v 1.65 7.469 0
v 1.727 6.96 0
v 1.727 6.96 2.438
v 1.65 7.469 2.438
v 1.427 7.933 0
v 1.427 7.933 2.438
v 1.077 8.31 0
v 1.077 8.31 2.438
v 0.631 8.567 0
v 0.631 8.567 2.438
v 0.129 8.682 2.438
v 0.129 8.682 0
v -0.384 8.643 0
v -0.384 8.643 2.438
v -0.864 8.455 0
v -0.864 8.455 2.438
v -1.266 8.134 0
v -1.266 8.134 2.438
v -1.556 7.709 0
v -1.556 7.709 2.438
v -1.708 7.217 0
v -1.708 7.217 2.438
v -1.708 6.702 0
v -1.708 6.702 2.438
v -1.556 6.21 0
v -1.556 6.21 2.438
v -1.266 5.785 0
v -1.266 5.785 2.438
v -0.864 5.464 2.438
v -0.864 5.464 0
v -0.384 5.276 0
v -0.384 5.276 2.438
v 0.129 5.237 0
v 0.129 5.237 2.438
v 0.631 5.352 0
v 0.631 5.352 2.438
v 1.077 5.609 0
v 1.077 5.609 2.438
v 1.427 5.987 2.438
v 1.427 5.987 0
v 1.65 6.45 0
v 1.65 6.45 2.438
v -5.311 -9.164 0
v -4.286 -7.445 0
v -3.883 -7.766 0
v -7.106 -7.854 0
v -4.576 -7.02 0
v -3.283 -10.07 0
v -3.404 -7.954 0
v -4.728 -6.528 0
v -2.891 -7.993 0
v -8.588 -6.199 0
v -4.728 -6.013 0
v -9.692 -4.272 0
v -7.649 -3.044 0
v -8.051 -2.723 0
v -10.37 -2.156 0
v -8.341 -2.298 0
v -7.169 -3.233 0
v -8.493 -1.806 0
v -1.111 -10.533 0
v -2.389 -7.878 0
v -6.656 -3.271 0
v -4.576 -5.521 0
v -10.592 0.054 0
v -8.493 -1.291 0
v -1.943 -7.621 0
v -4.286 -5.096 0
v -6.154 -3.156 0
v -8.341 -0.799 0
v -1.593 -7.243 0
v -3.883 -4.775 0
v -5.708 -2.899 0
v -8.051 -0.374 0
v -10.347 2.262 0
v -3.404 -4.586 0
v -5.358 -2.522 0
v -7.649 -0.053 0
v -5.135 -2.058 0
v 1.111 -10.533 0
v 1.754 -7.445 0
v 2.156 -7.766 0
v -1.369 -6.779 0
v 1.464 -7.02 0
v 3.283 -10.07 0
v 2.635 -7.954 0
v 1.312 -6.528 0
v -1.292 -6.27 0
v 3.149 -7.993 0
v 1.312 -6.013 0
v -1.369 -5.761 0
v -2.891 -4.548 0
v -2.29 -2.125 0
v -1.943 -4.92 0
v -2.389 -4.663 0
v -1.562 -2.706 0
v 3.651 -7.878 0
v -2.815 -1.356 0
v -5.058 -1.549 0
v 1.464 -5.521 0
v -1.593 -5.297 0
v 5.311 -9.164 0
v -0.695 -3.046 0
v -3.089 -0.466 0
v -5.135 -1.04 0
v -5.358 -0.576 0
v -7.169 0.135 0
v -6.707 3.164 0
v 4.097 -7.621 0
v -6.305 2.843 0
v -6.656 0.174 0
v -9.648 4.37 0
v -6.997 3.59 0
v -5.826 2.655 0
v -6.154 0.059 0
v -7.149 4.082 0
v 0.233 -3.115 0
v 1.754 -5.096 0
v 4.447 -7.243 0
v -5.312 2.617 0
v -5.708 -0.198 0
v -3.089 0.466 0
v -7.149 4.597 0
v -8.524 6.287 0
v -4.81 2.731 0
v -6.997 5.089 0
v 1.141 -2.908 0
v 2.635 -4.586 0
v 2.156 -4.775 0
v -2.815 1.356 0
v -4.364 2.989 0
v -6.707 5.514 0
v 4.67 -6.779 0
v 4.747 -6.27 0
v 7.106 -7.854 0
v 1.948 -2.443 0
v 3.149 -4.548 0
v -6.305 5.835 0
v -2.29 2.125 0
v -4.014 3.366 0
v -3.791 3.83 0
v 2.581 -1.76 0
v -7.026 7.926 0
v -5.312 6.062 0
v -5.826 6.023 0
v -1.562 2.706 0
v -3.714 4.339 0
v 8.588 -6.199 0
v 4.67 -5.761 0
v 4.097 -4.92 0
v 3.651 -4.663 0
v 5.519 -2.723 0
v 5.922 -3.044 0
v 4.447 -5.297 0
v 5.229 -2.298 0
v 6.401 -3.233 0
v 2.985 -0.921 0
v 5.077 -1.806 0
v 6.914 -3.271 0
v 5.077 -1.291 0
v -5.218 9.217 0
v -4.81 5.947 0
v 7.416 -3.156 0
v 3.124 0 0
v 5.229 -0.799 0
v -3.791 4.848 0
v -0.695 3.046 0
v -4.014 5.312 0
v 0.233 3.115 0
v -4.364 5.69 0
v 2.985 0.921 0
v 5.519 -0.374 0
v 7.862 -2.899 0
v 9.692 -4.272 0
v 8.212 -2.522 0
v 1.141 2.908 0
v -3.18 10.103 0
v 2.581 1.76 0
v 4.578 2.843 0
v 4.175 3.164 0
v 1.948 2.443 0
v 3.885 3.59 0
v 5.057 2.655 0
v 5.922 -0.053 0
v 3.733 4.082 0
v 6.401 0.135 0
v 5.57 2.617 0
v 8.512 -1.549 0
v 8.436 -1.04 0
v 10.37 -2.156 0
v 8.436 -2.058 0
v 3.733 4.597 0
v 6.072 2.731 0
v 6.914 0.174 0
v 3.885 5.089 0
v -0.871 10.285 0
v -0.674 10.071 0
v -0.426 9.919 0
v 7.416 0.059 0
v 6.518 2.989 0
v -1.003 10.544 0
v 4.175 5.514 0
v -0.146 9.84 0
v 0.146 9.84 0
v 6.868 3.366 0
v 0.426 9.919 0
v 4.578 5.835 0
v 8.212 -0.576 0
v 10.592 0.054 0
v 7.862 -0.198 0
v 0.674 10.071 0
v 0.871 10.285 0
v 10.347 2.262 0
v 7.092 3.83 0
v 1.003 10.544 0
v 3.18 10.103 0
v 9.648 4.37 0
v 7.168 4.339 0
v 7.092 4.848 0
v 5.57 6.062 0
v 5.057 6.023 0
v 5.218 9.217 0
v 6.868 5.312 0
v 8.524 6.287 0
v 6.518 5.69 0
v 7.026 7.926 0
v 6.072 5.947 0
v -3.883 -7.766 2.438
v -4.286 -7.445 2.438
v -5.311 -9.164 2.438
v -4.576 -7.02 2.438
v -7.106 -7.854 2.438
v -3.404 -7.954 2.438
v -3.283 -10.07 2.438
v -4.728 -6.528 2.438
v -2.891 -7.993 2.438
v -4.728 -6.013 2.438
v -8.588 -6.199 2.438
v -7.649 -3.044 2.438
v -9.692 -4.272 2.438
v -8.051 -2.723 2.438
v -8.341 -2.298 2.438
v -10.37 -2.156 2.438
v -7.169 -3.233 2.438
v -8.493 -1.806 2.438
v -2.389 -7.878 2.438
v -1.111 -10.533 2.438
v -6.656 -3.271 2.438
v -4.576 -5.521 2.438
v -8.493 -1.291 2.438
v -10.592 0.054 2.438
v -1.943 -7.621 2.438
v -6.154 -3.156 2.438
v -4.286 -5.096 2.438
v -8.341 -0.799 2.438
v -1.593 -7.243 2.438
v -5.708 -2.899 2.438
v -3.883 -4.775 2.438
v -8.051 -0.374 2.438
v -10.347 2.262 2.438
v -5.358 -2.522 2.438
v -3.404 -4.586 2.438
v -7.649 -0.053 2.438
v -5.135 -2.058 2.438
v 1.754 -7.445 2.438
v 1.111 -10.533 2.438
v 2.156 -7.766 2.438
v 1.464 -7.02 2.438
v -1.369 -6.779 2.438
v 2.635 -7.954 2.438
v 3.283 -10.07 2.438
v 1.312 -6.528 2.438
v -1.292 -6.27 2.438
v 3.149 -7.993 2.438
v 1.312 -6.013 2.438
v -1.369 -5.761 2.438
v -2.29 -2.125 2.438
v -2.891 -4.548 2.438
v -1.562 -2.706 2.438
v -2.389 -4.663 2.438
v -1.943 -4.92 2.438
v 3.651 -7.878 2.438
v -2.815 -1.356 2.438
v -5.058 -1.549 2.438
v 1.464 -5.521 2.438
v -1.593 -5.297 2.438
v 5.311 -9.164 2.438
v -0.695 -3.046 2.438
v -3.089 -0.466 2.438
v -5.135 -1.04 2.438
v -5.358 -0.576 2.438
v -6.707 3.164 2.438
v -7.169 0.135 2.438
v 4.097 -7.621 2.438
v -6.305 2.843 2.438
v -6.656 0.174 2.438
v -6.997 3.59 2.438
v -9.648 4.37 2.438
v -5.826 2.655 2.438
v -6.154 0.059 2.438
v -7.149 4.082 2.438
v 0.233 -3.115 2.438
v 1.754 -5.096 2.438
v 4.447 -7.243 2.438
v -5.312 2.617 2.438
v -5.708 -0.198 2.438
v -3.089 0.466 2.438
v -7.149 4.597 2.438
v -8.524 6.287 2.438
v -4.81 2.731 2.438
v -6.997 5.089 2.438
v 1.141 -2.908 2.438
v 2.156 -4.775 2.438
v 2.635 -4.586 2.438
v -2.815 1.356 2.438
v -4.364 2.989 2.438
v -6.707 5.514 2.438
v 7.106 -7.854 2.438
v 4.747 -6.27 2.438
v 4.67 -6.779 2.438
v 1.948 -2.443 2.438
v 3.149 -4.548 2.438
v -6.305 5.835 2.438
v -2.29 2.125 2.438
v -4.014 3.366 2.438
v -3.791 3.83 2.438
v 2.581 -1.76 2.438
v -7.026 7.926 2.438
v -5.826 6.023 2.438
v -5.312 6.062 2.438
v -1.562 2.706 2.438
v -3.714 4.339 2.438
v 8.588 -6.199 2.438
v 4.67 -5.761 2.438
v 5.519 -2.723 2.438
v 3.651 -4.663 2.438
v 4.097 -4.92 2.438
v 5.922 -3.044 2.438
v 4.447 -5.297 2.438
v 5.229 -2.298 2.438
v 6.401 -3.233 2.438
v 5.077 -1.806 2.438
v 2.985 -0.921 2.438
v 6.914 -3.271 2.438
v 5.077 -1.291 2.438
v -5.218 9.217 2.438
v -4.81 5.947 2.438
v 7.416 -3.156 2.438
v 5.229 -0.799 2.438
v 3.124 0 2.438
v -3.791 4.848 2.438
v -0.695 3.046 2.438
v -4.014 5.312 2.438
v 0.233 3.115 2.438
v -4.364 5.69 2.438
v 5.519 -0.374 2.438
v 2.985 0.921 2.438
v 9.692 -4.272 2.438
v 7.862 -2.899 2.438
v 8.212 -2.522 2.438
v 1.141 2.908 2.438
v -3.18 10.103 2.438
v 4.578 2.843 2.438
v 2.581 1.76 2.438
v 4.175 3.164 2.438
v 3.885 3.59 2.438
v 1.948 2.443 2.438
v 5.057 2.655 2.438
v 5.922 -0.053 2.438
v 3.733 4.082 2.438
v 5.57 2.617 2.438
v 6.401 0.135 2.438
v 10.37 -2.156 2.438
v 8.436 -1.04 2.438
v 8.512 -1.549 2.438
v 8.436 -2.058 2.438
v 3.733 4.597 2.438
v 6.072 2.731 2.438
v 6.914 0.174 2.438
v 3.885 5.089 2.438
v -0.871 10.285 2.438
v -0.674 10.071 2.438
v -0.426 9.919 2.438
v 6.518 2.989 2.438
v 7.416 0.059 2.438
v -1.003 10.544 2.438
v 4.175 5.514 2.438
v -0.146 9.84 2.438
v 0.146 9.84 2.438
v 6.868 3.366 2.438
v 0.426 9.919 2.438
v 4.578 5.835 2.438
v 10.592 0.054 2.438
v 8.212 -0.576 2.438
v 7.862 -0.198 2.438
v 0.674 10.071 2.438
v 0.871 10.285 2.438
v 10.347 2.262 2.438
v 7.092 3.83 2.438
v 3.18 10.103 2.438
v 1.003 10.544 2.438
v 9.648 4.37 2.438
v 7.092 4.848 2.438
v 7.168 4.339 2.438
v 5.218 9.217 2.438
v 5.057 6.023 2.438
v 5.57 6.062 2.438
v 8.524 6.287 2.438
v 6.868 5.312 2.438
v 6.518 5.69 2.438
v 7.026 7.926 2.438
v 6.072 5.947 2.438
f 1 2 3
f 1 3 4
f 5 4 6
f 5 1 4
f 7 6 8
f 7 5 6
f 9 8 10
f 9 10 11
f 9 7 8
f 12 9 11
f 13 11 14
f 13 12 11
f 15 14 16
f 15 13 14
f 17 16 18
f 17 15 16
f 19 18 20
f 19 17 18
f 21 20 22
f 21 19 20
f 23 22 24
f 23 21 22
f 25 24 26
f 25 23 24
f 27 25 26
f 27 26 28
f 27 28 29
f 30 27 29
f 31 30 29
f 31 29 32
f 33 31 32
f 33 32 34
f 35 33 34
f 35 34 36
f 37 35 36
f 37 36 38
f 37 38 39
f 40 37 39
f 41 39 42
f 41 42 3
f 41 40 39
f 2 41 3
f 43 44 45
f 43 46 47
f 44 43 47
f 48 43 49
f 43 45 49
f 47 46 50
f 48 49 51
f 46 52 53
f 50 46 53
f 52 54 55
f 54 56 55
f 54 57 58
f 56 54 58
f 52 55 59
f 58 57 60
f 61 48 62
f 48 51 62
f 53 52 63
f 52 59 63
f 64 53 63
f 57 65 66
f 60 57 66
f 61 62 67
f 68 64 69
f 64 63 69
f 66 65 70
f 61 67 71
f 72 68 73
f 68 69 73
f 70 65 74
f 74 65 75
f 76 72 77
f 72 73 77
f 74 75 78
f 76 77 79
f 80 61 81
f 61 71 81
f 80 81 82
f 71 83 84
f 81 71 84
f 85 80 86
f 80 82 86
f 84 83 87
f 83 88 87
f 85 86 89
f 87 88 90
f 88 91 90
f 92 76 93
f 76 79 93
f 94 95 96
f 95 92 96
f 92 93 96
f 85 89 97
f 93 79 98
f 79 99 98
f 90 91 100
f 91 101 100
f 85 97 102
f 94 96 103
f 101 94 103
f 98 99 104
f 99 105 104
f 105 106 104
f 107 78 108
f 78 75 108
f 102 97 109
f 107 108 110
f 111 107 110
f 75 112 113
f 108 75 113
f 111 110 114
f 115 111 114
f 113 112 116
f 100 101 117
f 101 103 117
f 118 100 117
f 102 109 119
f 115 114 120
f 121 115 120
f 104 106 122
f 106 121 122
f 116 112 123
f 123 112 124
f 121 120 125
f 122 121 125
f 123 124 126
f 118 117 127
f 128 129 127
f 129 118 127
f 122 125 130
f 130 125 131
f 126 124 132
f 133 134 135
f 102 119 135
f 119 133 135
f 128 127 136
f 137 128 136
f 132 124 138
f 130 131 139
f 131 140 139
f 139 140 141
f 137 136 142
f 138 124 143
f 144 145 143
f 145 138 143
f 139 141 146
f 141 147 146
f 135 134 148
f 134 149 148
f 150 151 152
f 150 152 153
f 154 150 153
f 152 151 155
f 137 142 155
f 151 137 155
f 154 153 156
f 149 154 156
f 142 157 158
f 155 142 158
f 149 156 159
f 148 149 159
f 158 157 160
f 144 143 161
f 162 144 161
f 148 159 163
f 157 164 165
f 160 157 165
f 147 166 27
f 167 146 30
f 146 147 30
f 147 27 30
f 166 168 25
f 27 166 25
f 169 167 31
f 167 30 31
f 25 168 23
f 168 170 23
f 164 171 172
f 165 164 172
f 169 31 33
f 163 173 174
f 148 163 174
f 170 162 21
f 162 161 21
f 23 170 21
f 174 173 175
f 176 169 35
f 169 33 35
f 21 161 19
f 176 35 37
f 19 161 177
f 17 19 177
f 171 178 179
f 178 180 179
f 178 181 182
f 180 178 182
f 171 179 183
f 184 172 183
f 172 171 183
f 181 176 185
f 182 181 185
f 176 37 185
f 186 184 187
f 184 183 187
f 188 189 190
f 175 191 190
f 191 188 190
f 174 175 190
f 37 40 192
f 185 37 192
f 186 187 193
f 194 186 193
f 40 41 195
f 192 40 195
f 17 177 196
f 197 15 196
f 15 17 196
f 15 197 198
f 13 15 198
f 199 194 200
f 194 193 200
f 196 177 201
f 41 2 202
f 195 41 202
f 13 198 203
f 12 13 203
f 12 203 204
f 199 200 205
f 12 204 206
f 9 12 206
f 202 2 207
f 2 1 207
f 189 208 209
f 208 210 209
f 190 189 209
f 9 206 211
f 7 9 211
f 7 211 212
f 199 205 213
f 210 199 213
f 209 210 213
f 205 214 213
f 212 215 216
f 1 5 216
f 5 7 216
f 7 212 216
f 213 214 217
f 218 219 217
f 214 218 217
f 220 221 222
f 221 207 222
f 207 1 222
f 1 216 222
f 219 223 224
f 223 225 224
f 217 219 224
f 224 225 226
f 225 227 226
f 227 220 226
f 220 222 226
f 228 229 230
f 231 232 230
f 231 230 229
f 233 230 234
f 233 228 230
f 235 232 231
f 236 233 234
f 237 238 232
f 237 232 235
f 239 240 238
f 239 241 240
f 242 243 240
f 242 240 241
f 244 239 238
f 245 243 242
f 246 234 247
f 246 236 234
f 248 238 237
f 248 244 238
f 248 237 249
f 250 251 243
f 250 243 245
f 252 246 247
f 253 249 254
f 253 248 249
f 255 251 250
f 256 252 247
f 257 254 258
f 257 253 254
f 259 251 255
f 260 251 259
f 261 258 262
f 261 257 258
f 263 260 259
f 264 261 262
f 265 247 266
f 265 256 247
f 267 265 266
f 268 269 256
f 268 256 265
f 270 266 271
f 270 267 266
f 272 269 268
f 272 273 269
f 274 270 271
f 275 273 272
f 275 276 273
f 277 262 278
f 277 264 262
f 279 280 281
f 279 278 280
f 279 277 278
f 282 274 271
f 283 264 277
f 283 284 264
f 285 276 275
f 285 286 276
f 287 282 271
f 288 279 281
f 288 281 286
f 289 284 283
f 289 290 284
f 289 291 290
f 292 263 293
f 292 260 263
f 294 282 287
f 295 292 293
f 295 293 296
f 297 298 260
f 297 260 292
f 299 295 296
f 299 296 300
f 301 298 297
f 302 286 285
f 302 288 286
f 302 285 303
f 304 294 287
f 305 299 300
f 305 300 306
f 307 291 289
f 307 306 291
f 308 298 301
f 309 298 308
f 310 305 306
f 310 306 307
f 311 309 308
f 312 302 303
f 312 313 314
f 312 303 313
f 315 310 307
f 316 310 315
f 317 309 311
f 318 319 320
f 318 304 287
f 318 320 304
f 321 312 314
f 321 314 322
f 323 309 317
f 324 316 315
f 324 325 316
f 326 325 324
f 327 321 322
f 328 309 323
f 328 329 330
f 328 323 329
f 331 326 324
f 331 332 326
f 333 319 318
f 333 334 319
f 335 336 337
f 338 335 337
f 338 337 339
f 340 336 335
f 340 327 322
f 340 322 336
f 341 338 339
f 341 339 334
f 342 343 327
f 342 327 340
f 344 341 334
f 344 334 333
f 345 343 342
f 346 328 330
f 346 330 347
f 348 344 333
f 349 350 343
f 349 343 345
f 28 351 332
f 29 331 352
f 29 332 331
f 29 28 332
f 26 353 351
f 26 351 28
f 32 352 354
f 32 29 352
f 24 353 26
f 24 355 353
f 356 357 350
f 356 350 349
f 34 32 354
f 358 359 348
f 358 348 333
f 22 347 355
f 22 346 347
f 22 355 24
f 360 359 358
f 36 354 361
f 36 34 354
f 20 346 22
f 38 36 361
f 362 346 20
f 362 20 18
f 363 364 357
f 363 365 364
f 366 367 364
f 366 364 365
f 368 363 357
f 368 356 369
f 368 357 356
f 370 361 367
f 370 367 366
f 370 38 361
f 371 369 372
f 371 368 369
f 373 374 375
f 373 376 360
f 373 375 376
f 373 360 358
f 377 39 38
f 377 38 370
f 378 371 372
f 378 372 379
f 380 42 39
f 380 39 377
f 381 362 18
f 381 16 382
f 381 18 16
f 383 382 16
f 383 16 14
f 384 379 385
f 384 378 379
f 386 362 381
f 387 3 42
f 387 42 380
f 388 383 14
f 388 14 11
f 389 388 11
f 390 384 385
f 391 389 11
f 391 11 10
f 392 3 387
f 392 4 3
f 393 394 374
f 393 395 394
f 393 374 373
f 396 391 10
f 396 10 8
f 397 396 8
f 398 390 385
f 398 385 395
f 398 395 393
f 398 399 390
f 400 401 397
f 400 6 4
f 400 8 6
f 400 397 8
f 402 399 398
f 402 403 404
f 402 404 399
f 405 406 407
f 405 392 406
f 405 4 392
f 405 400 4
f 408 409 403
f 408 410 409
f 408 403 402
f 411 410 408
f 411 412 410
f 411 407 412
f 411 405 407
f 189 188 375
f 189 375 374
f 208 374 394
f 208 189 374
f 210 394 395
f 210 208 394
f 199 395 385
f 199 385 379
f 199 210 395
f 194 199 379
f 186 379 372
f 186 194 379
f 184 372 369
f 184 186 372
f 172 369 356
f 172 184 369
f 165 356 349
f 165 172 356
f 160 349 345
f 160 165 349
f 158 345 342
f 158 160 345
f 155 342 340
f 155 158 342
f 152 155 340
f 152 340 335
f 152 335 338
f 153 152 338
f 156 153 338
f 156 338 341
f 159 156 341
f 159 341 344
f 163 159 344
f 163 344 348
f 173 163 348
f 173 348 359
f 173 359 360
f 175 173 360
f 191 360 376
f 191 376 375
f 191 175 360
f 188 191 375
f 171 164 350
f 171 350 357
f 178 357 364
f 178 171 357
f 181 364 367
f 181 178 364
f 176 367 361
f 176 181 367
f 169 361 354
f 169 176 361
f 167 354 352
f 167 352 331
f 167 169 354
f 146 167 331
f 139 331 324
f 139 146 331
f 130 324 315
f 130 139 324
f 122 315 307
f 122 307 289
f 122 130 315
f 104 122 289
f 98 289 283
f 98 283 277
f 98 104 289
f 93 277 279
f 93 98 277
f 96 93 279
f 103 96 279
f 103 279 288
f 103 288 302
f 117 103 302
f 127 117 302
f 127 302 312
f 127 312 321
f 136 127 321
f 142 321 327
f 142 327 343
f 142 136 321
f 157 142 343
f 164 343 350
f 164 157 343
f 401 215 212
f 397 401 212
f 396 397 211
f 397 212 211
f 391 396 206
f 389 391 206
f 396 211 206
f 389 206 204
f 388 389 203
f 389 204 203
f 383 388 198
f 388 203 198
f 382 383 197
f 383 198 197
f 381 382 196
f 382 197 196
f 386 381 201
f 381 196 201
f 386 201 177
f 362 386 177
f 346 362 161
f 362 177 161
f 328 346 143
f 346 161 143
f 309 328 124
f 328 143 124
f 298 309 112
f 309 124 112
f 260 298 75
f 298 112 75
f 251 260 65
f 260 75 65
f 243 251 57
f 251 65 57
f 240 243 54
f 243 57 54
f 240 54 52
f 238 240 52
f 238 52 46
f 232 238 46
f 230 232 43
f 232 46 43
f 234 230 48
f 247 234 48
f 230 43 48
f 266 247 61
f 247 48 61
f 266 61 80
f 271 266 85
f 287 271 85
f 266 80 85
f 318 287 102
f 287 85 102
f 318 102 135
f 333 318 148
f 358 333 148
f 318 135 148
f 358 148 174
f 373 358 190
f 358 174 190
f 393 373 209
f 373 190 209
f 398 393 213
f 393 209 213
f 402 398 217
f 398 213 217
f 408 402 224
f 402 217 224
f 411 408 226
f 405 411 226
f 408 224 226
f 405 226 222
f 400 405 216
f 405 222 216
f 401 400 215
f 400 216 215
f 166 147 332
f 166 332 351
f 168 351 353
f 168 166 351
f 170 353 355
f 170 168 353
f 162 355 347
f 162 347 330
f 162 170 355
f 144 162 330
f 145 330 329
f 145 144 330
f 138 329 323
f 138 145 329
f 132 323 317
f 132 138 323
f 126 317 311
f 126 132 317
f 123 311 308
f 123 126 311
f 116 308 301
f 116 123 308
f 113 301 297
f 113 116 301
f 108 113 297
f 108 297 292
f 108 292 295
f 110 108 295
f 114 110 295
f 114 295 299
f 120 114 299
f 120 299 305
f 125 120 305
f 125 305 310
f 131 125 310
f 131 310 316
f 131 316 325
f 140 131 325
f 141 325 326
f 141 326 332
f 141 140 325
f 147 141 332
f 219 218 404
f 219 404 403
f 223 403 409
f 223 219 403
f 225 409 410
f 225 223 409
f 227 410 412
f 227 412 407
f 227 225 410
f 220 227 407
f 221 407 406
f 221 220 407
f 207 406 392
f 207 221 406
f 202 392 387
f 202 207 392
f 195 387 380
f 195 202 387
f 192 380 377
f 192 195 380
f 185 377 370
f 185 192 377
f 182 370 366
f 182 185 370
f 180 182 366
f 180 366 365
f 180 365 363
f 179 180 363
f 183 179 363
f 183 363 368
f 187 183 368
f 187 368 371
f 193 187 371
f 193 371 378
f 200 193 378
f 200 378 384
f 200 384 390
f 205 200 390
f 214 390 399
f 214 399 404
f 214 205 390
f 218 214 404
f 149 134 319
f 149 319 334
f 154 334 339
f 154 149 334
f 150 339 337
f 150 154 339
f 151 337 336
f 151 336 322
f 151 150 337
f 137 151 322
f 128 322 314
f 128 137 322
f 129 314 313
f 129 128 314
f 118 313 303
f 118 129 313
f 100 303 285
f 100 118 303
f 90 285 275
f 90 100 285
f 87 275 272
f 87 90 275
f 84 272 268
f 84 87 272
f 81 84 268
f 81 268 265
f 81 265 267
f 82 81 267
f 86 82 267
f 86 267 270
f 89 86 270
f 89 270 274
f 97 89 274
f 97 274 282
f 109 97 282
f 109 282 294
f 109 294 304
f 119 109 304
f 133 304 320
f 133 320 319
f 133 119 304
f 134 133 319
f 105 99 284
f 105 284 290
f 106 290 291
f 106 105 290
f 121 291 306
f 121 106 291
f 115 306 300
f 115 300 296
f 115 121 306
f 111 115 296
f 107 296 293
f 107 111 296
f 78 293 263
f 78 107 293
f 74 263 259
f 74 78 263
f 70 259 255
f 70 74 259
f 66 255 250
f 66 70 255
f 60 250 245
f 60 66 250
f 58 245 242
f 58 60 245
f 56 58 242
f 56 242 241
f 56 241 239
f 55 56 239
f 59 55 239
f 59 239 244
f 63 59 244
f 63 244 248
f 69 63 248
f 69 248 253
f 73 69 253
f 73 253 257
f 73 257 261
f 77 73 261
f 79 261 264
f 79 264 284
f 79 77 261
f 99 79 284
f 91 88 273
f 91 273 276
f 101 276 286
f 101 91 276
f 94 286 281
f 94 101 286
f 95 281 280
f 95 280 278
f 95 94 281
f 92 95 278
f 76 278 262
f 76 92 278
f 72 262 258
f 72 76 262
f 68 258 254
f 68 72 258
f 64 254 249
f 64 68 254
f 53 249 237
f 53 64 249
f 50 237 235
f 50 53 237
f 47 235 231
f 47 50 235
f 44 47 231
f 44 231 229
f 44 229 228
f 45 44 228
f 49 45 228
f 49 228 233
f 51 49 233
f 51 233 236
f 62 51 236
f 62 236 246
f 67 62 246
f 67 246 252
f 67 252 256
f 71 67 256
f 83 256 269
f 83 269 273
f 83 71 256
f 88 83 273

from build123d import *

# Parameters (mm, degrees)
SKETCH1_R           = 1.7272
SKETCH1_R_2         = 3.1242
BOSS_EXTRUDE1_DEPTH = 2.4384


with BuildPart() as part:
    # Sketch1 → Boss-Extrude1 (new body)
    with BuildSketch(Plane.XY):
        with BuildLine():
            ThreePointArc((-1.0033, 10.544174522), (0, -10.5918), (1.0033, 10.544174522))
            ThreePointArc((1.0033, 10.544174522), (0, 9.8298), (-1.0033, 10.544174522))
        make_face()
        with Locations((0, 6.9596)):
            Circle(SKETCH1_R, mode=Mode.SUBTRACT)
        with Locations((-5.441234385, 4.339239625)):
            Circle(SKETCH1_R, mode=Mode.SUBTRACT)
        with Locations((-6.785108298, -1.548656692)):
            Circle(SKETCH1_R, mode=Mode.SUBTRACT)
        with Locations((-3.019657271, -6.270382933)):
            Circle(SKETCH1_R, mode=Mode.SUBTRACT)
        with Locations((3.019657271, -6.270382933)):
            Circle(SKETCH1_R, mode=Mode.SUBTRACT)
        with Locations((6.785108298, -1.548656692)):
            Circle(SKETCH1_R, mode=Mode.SUBTRACT)
        with Locations((5.441234385, 4.339239625)):
            Circle(SKETCH1_R, mode=Mode.SUBTRACT)
        Circle(SKETCH1_R_2, mode=Mode.SUBTRACT)
    extrude(amount=BOSS_EXTRUDE1_DEPTH)


solid = part.part
